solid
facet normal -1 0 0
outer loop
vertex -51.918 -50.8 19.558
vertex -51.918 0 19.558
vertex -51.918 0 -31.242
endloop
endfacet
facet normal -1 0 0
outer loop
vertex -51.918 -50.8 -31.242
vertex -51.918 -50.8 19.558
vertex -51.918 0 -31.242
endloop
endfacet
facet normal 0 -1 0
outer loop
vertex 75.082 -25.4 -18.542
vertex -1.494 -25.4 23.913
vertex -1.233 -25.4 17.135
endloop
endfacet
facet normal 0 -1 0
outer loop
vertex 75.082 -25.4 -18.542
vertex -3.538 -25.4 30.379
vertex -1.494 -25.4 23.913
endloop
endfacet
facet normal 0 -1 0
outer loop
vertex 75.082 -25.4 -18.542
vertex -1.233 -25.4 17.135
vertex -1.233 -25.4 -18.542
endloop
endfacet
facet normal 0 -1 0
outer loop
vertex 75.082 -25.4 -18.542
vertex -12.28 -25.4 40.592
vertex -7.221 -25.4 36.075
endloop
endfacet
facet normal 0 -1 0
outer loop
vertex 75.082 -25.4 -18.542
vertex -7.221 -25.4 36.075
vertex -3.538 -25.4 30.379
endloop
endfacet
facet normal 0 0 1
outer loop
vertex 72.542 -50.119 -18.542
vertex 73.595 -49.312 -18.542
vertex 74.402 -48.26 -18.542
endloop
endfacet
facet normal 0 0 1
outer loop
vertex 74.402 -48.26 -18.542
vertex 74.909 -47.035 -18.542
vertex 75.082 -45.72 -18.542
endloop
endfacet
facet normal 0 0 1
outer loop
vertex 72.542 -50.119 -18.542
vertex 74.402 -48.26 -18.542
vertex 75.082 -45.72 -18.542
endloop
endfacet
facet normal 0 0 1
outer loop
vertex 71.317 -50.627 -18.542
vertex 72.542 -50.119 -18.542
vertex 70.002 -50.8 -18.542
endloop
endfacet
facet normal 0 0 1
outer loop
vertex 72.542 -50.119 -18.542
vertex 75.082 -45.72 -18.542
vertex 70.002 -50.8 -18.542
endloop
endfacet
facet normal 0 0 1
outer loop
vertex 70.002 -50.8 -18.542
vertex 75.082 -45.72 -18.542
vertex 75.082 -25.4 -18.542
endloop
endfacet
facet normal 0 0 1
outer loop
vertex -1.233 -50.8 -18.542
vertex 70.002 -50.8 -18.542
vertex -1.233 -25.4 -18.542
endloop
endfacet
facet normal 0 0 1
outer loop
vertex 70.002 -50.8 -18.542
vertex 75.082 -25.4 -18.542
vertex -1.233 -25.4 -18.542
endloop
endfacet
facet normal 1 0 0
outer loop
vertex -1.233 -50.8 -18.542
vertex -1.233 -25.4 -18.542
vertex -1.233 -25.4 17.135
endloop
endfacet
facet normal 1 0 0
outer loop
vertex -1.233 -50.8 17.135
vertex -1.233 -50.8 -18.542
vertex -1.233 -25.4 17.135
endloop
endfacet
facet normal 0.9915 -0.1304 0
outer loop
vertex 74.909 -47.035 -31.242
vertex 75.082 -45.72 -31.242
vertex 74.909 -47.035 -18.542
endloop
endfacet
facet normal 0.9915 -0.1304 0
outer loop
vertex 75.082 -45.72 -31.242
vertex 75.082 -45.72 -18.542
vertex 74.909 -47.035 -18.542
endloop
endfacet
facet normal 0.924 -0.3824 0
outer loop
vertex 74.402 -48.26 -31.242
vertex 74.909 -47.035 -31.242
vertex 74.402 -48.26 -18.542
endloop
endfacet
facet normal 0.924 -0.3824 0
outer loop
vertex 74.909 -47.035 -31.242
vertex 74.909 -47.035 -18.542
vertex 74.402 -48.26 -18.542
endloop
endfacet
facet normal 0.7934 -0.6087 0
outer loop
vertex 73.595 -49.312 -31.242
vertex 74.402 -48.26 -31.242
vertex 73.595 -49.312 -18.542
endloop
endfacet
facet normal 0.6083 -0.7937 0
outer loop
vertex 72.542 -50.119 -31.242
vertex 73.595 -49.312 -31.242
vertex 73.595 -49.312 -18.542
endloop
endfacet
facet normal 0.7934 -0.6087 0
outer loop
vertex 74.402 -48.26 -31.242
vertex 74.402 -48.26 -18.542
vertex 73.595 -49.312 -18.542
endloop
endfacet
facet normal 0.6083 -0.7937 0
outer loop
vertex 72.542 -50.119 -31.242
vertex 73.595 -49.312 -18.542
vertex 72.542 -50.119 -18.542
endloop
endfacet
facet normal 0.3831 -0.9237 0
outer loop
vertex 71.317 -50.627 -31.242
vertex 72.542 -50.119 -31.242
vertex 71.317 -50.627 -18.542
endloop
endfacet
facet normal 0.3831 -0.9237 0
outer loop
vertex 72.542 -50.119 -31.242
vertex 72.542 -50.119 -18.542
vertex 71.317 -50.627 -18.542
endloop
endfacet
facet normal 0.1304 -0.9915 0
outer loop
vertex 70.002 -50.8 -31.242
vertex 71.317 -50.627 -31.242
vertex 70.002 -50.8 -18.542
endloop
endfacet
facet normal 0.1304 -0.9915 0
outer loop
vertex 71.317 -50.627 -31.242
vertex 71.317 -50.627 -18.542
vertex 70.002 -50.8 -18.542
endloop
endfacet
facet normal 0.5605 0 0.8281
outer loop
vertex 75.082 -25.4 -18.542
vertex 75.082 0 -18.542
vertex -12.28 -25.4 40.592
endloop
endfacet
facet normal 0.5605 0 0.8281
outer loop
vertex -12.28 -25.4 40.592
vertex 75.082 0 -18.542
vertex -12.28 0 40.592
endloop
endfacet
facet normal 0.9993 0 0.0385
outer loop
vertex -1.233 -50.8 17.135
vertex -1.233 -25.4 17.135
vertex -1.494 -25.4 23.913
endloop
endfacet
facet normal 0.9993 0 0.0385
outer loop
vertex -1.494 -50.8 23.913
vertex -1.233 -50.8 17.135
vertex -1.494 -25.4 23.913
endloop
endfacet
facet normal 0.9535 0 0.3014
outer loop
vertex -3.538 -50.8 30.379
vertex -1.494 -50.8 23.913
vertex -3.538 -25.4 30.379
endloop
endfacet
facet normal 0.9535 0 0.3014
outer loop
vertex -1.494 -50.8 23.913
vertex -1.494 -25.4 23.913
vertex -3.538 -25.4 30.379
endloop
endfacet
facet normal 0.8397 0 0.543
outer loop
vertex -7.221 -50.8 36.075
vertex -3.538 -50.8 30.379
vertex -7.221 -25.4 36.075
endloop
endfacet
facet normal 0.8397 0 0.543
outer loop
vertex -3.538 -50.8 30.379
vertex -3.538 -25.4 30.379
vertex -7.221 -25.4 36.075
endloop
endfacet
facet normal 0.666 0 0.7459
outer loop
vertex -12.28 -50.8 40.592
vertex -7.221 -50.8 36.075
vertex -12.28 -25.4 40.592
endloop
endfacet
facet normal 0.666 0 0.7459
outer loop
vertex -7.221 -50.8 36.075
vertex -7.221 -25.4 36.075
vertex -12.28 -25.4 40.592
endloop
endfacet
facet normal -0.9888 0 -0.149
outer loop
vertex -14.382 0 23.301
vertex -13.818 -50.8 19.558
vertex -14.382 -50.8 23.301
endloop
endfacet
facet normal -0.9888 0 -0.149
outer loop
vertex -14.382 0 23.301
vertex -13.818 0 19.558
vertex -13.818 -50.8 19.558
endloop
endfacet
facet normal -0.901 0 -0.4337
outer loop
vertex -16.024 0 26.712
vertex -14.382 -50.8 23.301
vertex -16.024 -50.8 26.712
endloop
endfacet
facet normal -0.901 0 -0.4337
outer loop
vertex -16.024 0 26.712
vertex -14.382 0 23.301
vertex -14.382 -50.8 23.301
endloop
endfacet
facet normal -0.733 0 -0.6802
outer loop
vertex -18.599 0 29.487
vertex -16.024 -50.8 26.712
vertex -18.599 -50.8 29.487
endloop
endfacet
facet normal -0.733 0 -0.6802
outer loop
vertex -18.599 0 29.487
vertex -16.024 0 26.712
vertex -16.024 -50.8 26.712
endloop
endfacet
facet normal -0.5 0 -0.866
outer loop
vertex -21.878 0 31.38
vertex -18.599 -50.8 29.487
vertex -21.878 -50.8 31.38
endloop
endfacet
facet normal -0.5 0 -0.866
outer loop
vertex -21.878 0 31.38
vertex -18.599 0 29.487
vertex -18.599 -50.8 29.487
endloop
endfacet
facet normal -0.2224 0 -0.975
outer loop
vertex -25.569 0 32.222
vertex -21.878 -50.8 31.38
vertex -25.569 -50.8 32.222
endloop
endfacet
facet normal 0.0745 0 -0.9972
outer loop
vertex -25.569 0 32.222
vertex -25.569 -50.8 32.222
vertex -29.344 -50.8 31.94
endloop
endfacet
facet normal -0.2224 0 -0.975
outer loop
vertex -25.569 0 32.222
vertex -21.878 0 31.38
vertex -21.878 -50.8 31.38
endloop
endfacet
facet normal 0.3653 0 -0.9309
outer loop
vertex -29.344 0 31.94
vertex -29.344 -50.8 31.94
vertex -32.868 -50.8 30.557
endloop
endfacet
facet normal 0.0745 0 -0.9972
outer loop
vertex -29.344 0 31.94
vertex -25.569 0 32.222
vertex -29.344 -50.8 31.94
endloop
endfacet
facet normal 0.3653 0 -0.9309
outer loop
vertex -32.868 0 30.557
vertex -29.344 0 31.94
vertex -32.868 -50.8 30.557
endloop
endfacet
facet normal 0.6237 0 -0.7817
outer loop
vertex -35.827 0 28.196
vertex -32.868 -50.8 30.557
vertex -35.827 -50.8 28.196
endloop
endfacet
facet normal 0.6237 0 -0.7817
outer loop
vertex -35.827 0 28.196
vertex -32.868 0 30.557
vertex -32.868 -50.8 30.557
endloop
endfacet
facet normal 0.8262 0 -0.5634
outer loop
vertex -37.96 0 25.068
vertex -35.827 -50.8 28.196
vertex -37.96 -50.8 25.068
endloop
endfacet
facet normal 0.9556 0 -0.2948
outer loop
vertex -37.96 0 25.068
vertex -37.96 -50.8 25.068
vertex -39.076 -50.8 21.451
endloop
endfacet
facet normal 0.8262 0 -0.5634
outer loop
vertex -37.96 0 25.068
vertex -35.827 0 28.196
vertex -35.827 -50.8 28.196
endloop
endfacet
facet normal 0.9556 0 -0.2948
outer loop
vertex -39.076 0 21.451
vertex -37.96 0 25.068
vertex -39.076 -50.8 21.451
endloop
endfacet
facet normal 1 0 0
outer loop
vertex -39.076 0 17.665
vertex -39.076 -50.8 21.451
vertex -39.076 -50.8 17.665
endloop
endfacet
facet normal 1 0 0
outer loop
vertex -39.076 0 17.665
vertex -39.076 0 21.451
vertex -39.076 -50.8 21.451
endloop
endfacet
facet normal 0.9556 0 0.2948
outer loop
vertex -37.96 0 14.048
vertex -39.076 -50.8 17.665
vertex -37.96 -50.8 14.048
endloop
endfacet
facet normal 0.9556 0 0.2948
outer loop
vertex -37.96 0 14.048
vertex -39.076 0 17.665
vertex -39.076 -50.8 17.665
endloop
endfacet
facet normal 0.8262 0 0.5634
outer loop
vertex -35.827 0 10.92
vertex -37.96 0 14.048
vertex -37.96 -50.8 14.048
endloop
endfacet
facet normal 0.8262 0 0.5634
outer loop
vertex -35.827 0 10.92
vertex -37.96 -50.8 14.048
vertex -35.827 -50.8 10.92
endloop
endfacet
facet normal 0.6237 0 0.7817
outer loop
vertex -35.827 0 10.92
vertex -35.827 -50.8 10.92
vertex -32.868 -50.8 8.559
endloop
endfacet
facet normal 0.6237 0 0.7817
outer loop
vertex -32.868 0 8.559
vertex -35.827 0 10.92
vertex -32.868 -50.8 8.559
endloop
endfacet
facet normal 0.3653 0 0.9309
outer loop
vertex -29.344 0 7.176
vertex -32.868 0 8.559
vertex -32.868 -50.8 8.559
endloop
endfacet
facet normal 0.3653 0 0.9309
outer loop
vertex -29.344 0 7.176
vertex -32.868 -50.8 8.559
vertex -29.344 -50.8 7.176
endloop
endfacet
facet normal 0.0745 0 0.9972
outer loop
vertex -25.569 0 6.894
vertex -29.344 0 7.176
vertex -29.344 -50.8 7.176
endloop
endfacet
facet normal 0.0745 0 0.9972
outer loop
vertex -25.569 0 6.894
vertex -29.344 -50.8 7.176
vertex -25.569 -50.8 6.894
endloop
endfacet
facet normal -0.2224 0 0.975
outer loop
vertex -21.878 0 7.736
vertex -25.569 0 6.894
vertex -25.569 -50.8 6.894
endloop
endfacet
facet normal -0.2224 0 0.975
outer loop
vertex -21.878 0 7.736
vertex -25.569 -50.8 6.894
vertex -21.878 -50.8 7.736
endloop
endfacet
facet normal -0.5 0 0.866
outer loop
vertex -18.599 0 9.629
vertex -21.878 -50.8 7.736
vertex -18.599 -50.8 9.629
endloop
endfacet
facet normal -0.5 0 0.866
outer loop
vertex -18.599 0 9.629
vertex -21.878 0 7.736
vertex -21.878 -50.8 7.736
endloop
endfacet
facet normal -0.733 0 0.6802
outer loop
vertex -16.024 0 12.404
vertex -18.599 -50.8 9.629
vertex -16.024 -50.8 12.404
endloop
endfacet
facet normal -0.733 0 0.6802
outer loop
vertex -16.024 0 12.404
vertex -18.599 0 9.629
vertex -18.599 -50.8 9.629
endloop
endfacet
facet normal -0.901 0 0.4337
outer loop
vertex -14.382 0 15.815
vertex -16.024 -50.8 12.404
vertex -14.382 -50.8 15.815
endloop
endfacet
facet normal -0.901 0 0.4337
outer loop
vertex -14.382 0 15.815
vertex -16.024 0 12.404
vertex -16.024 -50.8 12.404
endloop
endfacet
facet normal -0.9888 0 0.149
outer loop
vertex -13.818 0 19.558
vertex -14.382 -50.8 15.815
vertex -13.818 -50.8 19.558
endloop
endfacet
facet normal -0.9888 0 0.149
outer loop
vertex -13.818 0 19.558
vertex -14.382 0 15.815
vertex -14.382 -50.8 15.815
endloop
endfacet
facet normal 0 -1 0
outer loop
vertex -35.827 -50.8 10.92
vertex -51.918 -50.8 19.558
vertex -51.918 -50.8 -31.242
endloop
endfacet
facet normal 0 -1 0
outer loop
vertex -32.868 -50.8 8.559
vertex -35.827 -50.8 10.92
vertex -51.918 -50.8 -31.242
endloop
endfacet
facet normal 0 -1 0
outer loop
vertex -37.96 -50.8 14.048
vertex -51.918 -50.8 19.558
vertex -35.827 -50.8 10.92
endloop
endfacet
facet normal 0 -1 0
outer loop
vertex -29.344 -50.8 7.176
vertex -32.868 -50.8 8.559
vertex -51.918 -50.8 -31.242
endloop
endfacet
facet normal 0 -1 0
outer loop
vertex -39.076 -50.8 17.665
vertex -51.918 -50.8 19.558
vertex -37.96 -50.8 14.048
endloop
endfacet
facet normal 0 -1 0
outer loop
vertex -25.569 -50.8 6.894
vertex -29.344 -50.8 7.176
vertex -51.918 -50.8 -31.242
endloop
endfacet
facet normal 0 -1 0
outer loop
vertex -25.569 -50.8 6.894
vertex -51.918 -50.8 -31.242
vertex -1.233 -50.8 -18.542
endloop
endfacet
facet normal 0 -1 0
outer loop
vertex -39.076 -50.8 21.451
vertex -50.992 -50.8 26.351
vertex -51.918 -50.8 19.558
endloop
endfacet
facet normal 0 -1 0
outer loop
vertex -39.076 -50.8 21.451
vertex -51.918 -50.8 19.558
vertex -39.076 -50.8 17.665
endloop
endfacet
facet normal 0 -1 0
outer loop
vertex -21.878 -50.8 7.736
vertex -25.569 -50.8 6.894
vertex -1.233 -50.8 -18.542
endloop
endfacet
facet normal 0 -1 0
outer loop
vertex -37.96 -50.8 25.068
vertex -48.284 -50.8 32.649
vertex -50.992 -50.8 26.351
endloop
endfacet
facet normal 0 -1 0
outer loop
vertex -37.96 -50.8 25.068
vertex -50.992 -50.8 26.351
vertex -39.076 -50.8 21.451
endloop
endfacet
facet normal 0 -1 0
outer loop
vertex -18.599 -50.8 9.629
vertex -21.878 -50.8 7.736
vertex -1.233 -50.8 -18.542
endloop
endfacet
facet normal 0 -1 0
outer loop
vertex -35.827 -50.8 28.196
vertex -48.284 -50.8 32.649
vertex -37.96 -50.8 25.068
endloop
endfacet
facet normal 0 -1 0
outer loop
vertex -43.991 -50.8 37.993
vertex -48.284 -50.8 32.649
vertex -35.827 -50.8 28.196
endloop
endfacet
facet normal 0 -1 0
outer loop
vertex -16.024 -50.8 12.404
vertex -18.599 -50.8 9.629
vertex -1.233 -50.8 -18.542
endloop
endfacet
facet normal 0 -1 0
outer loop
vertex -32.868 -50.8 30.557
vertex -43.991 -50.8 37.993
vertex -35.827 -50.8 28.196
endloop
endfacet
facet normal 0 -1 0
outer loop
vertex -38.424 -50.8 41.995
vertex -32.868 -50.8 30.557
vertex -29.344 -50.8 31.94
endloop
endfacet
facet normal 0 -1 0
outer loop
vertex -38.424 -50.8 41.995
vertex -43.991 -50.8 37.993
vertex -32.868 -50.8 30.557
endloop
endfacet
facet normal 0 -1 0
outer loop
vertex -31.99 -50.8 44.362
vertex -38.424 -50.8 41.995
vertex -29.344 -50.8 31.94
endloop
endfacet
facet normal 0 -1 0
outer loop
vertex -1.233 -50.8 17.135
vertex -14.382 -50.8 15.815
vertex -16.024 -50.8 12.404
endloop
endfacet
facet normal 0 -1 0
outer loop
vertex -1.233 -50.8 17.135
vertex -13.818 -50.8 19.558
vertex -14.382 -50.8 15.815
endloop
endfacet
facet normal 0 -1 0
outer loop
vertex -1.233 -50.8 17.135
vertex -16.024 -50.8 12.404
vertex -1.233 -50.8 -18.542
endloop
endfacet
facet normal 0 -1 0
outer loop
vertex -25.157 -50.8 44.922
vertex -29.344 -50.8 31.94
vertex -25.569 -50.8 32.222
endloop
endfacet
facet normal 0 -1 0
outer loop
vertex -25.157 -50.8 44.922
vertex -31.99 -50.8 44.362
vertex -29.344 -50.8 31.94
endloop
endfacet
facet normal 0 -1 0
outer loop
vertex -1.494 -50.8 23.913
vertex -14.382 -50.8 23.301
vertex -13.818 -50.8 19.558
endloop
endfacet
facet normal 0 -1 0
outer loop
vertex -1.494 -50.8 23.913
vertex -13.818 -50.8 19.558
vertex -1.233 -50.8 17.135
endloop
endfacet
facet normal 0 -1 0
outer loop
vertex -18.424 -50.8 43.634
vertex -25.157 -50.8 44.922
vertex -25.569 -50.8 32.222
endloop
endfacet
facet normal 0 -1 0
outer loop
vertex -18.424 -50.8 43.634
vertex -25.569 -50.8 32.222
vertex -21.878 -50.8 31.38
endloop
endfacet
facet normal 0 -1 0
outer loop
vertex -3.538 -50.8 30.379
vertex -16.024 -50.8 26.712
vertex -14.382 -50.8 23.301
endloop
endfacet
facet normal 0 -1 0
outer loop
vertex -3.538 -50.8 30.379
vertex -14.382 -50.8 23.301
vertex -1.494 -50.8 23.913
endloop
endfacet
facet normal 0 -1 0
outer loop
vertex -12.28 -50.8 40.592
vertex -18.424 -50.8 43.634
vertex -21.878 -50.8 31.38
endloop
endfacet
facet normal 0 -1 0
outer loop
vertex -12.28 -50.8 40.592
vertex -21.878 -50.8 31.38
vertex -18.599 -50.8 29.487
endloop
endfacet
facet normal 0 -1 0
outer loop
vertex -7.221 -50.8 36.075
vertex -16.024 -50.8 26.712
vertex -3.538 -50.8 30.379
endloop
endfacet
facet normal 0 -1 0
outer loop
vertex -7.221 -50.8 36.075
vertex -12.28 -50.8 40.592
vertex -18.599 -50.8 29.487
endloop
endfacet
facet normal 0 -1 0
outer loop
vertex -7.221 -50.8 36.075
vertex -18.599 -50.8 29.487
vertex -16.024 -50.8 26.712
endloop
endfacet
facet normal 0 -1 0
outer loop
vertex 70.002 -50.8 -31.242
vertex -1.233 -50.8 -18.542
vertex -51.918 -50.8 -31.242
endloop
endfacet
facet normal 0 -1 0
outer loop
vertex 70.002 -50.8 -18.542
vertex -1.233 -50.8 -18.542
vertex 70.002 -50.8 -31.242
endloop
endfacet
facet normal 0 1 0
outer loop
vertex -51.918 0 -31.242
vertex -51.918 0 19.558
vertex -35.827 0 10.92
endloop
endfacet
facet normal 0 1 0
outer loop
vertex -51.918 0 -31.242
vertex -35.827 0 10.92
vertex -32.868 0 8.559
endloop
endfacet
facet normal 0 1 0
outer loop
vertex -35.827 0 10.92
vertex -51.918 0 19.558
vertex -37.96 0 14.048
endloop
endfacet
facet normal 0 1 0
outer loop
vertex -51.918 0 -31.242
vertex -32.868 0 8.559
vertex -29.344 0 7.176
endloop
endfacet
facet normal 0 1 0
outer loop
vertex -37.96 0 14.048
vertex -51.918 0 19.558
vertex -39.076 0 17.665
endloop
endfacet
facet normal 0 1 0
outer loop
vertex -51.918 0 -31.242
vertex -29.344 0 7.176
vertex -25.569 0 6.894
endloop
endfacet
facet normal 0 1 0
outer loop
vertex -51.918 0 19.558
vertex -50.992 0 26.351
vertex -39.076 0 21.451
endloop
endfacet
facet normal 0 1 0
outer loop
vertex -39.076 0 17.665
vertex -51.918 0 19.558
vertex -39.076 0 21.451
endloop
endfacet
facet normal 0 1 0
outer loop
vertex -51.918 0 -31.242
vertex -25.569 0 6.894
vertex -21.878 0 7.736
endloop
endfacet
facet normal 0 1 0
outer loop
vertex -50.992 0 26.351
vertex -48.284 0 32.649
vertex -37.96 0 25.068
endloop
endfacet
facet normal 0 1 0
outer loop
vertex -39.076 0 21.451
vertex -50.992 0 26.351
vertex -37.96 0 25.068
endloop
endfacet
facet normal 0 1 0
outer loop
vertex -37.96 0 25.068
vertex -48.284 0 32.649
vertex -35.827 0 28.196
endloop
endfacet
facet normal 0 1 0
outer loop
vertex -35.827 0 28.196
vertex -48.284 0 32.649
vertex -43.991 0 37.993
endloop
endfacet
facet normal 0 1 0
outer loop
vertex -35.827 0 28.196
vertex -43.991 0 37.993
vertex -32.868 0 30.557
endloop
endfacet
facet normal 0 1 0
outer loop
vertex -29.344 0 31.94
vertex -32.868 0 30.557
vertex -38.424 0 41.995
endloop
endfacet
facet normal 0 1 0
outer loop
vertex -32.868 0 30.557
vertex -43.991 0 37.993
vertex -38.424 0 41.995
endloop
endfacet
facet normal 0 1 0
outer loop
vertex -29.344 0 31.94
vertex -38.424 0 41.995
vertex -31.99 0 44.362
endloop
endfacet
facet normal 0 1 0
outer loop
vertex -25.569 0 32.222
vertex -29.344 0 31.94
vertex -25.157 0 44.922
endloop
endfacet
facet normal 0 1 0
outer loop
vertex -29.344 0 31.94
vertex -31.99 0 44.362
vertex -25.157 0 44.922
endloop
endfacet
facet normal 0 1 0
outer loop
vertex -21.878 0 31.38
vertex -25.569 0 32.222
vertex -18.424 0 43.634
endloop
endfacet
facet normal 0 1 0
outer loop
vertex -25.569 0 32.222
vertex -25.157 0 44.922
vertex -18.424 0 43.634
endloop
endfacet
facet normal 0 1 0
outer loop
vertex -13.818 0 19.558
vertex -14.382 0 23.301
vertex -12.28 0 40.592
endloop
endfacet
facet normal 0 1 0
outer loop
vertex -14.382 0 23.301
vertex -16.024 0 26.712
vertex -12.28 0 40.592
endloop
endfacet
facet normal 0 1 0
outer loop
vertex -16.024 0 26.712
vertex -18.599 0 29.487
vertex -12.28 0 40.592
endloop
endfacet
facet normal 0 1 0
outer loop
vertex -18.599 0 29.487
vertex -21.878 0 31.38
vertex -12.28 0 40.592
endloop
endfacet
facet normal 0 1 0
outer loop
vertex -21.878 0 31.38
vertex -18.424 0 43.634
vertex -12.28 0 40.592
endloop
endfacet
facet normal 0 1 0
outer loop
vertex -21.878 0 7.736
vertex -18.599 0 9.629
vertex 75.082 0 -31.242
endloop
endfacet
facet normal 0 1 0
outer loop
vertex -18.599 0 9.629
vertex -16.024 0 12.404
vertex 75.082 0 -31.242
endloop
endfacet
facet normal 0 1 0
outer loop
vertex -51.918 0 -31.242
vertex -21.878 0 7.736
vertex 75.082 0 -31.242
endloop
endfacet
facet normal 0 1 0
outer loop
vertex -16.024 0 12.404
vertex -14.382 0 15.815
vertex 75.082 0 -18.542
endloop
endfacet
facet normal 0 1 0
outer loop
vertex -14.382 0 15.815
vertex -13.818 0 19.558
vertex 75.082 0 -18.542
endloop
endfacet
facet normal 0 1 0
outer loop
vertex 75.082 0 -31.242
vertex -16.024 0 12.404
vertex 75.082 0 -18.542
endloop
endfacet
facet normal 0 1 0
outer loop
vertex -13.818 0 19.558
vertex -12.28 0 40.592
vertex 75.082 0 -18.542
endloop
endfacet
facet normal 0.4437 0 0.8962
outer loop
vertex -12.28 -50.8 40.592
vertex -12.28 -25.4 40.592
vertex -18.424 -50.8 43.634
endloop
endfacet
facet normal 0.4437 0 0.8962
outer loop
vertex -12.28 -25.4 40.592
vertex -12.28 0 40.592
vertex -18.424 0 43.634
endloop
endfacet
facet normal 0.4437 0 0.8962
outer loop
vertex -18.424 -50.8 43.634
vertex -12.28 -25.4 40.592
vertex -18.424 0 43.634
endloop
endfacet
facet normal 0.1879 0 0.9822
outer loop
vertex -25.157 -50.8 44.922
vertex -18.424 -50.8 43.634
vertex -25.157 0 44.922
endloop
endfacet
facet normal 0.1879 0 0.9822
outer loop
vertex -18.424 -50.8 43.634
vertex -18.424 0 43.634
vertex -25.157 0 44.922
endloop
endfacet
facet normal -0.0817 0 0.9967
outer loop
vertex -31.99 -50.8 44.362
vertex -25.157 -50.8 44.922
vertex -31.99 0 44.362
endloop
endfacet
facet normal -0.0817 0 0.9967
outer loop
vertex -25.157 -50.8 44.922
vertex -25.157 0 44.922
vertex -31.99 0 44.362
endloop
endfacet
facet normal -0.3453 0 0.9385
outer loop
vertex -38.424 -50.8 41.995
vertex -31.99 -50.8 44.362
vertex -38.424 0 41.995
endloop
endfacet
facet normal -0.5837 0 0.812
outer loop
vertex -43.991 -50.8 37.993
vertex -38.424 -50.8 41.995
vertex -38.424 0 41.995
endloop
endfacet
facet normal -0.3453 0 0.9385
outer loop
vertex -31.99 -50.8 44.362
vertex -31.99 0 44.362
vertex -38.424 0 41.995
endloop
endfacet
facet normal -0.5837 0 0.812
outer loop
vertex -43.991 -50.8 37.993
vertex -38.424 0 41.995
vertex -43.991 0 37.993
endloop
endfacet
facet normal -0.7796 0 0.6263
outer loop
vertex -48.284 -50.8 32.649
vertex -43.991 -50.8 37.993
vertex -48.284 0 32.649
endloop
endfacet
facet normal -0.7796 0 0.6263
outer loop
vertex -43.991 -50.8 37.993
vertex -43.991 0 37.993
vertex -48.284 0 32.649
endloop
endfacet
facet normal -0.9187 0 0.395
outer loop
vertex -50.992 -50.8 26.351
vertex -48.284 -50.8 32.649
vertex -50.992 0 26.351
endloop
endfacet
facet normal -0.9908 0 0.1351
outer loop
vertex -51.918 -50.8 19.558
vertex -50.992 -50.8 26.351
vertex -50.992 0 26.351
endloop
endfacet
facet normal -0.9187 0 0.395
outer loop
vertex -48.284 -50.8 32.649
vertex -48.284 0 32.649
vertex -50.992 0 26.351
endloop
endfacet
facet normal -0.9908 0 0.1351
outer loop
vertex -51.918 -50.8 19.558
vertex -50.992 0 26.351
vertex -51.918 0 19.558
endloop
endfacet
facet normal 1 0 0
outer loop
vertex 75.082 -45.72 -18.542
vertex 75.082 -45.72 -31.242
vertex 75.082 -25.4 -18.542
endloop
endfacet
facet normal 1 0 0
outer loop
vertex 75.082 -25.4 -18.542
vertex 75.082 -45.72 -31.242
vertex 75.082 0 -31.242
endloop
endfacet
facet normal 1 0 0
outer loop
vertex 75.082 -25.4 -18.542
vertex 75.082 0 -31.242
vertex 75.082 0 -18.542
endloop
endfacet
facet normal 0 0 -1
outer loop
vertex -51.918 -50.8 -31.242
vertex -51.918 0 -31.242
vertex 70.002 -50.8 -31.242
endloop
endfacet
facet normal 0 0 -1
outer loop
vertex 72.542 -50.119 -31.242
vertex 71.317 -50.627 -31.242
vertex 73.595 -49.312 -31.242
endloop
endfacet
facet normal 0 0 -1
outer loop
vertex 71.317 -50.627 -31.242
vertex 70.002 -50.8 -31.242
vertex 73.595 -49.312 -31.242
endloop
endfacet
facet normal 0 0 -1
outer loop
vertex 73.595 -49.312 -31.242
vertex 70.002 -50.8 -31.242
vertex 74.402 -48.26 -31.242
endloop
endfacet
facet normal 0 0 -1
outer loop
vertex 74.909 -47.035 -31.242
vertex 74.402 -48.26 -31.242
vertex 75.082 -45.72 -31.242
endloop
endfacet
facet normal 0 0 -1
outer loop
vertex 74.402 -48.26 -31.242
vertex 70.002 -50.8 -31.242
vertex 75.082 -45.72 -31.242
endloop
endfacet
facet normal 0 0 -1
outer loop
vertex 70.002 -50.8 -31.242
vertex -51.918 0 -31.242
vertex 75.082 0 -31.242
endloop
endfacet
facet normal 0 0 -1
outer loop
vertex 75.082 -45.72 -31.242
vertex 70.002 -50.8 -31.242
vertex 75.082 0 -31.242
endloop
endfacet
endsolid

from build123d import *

# Parameters (mm, degrees)
F0_R     = 12.7
F1_DEPTH = 25.4
F2_R     = 12.7
F3_DEPTH = 25.4
F4_R     = 5.08


with BuildPart() as f1:
    # F0 (on Front) → F1 (new body)
    with BuildSketch(Plane.XZ):
        with BuildLine():
            Line((75.0824, -18.542002), (-12.279727, 40.592327))
            ThreePointArc((-12.279727, 40.592327), (-38.423859, 41.994598), (-51.9176, 19.557998))
            Line((-51.9176, 19.557998), (-51.9176, -31.242002))
            Line((-51.9176, -31.242002), (75.0824, -31.242002))
            Line((75.0824, -31.242002), (75.0824, -18.542002))
        make_face()
        with Locations((-26.5176, 19.557998)):
            Circle(F0_R, mode=Mode.SUBTRACT)
    extrude(amount=F1_DEPTH)

    # F2 (on face) → F3 (join)
    with BuildSketch(Plane.XZ.offset(25.4)):
        with BuildLine():
            Line((75.0824, -31.242002), (75.0824, -18.542002))
            Line((75.0824, -18.542002), (-1.233405, -18.542002))
            Line((-1.233405, -18.542002), (-1.233405, 17.13529))
            ThreePointArc((-1.233405, 17.13529), (-3.538118, 30.379431), (-12.279727, 40.592327))
            ThreePointArc((-12.279727, 40.592327), (-38.423859, 41.994598), (-51.9176, 19.557998))
            Line((-51.9176, 19.557998), (-51.9176, -18.542002))
            Line((-51.9176, -18.542002), (-51.9176, -31.242002))
            Line((-51.9176, -31.242002), (75.0824, -31.242002))
        make_face()
        with Locations((-26.5176, 19.557998)):
            Circle(F2_R, mode=Mode.SUBTRACT)
    extrude(amount=F3_DEPTH)

    # F4
    f4_edges = [f1.edges().sort_by_distance(p)[0] for p in [
        (75.0824, -50.8, -24.892002),
    ]]
    fillet(f4_edges, radius=F4_R)


solid = f1.part
